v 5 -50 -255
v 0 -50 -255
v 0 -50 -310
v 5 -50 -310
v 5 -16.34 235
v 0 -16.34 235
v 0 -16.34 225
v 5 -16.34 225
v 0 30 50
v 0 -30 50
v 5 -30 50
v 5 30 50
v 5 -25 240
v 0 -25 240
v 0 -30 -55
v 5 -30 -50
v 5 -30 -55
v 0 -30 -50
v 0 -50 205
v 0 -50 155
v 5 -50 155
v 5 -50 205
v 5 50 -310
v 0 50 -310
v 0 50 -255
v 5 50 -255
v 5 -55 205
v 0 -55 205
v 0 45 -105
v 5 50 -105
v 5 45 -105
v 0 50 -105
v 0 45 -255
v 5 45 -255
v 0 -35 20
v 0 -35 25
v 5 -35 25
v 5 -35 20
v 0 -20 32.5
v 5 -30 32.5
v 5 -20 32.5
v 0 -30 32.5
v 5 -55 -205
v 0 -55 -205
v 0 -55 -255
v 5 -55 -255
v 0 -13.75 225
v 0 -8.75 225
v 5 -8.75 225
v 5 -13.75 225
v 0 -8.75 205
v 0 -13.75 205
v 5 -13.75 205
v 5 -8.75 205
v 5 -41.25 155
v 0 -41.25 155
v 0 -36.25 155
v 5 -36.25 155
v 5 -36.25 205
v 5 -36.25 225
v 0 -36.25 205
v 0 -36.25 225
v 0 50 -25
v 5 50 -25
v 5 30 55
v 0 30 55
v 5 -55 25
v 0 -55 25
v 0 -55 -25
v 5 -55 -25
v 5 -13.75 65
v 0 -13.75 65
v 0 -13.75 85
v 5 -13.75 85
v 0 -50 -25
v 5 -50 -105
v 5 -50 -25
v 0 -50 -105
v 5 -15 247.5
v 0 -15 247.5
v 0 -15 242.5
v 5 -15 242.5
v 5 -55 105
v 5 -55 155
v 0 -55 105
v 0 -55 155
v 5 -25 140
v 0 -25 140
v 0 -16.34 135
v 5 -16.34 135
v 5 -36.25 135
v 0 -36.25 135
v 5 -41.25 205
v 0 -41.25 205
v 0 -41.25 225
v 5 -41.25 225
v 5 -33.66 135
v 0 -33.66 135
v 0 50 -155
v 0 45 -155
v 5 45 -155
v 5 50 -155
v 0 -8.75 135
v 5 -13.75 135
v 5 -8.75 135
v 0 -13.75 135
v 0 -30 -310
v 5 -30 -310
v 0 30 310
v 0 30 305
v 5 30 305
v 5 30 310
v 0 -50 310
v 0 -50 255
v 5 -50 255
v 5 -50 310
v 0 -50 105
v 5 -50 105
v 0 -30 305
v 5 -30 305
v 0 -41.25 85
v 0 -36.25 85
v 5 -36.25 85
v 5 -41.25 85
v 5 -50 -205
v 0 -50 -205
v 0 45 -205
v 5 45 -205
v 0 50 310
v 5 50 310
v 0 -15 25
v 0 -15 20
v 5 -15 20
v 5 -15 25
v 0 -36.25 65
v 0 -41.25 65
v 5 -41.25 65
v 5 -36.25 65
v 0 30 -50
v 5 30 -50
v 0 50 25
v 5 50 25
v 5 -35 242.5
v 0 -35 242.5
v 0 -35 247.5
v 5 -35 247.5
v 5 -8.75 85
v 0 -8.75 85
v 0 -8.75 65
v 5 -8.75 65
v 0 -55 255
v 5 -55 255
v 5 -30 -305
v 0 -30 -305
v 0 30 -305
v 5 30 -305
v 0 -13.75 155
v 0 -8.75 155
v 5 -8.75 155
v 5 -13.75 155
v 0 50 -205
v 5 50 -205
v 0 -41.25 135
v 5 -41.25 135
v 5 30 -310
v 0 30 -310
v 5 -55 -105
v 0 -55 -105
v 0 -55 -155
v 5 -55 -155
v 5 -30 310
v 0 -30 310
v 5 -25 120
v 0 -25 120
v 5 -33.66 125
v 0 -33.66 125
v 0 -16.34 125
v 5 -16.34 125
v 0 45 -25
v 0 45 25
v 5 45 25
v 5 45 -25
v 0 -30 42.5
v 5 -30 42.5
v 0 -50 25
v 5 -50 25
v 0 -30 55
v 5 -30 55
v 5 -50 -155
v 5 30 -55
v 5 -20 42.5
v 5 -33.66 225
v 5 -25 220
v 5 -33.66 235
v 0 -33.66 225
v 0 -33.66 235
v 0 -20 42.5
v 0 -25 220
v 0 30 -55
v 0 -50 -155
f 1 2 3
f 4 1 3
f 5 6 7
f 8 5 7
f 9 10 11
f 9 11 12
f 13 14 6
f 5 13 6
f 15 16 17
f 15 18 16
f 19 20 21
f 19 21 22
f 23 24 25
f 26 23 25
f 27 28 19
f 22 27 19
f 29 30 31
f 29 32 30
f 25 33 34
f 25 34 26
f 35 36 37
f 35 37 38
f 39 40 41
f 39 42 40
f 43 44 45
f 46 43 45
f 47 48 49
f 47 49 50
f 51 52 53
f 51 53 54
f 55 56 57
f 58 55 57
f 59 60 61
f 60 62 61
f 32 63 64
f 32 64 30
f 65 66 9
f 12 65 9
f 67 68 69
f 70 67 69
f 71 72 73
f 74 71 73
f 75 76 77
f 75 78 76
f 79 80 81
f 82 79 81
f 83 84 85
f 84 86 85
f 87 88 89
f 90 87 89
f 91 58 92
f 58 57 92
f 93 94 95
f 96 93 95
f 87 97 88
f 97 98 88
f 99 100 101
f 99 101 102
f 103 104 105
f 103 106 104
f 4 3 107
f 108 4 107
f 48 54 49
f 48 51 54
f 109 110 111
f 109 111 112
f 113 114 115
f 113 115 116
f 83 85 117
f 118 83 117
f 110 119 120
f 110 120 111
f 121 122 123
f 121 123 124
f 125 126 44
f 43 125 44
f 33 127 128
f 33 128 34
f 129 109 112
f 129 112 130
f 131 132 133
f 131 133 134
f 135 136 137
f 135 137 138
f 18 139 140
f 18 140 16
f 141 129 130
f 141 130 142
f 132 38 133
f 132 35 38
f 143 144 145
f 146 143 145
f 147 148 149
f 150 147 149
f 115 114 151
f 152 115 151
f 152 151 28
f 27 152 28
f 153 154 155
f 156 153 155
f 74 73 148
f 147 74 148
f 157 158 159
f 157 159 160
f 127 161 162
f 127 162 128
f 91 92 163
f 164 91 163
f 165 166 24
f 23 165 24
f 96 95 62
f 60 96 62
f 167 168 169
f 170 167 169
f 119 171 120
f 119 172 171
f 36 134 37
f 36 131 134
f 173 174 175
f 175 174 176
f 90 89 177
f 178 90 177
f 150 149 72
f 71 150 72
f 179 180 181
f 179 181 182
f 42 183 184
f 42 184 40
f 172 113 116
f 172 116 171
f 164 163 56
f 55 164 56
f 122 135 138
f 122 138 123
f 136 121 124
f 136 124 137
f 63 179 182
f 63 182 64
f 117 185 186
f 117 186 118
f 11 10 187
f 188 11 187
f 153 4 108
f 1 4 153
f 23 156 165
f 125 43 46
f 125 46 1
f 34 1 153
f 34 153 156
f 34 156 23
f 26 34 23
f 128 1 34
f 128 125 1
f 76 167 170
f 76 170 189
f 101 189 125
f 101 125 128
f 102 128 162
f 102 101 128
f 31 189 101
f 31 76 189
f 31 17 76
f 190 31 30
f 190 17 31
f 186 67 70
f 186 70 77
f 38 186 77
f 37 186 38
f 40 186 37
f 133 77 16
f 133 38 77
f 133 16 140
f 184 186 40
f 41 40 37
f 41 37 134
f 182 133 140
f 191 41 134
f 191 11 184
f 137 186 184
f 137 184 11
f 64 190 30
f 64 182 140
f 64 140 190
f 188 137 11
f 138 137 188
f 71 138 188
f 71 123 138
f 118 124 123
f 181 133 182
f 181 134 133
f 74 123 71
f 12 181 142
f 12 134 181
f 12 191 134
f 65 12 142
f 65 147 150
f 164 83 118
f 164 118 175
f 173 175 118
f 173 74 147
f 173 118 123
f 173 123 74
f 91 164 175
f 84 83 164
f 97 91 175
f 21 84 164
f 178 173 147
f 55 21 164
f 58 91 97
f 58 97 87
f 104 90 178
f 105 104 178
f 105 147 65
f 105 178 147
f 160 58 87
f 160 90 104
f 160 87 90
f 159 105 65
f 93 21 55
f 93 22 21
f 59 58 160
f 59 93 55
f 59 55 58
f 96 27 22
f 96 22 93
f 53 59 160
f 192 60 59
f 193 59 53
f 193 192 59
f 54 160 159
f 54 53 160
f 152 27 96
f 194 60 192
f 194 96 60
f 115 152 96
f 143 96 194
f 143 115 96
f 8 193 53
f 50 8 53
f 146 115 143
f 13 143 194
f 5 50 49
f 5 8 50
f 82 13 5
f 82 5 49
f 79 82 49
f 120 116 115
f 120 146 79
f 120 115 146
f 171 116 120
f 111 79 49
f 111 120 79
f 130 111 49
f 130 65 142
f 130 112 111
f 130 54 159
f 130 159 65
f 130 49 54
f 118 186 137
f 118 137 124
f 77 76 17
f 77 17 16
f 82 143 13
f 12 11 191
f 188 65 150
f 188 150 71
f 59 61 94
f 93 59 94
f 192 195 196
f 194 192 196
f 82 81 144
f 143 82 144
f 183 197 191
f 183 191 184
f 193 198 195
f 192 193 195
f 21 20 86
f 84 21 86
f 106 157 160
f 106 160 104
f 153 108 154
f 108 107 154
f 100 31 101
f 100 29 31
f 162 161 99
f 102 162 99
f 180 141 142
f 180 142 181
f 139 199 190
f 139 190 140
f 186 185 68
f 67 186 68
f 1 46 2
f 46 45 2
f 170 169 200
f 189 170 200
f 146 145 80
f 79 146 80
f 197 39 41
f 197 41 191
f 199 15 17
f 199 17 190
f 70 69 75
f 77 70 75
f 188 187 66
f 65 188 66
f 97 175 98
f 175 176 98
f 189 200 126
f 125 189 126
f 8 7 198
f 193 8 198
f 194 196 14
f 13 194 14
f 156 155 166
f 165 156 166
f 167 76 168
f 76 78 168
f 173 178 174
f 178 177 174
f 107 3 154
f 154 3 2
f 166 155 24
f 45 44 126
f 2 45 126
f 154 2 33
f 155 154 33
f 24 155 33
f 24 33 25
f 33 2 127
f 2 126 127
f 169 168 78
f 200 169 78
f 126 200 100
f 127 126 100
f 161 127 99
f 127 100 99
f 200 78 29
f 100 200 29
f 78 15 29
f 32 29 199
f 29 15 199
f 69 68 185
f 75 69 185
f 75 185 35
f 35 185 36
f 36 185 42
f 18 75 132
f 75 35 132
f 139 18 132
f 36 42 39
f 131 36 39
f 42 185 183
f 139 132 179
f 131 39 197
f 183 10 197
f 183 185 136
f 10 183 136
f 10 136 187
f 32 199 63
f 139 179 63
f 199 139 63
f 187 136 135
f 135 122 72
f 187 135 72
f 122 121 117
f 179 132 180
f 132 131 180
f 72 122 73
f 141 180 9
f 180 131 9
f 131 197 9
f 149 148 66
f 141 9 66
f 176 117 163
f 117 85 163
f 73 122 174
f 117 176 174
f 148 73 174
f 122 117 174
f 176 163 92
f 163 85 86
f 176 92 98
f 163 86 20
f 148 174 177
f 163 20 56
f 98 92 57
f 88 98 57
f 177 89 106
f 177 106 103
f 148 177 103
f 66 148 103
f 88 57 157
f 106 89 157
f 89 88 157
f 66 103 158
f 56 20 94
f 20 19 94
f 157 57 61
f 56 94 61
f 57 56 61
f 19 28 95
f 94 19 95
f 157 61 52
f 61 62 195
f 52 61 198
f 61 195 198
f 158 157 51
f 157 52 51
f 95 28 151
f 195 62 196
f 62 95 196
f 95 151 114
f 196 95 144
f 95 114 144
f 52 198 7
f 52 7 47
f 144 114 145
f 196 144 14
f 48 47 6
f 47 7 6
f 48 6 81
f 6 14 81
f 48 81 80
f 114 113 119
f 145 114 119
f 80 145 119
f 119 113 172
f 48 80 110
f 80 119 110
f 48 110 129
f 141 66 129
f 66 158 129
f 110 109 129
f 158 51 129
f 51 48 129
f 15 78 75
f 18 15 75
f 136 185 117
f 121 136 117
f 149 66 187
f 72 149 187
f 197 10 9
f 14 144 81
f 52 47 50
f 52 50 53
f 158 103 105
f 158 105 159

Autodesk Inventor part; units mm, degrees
ref_plane "YZ Plane" through (0, 0, 0) normal (1, 0, 0) x (0, 1, 0)
ref_plane "XZ Plane" through (0, 0, 0) normal (0, 1, 0) x (-1, 0, 0)
ref_plane "XY Plane" through (0, 0, 0) normal (0, 0, 1) x (1, 0, 0)
sketch "Sketch1" plane through (0, 0, 0) normal (1, 0, 0) x (0, 1, 0)
  line L0 (-50, 50) -> (50, 50)
  line L1 (50, 50) -> (50, -50)
  line L2 (50, -50) -> (-50, -50)
  line L3 (-50, -50) -> (-50, 50)
  line L4 (-50, 50) -> (50, -50) construction
  line L5 (50, 50) -> (-50, -50) construction
  line L6 (50, 50) -> (-50, 50)
  line L7 (-50, 50) -> (-50, 310)
  line L8 (-50, 310) -> (50, 310)
  line L9 (50, 310) -> (50, 50)
  line L10 (50, -50) -> (-50, -50)
  line L11 (-50, -50) -> (-50, -310)
  line L12 (-50, -310) -> (50, -310)
  line L13 (50, -310) -> (50, -50)
  line L14 (-50, 255) -> (-55, 255)
  line L15 (-55, 255) -> (-55, 205)
  line L16 (-55, 205) -> (-50, 205)
  line L17 (-50, 205) -> (-50, 255)
  line L18 (-50, 155) -> (-55, 155)
  line L19 (-55, 155) -> (-55, 105)
  line L20 (-55, 105) -> (-50, 105)
  line L21 (-50, 105) -> (-50, 155)
  line L22 (-50, 25) -> (-55, 25)
  line L23 (-55, 25) -> (-55, -25)
  line L24 (-55, -25) -> (-50, -25)
  line L25 (-50, -25) -> (-50, 25)
  line L26 (-50, -105) -> (-55, -105)
  line L27 (-55, -105) -> (-55, -155)
  line L28 (-55, -155) -> (-50, -155)
  line L29 (-50, -155) -> (-50, -105)
  line L30 (-50, -205) -> (-55, -205)
  line L31 (-55, -205) -> (-55, -255)
  line L32 (-55, -255) -> (-50, -255)
  line L33 (-50, -255) -> (-50, -205)
  line L34 (50, 310) -> (30, 310)
  line L35 (50, 305) -> (50, 310)
  line L36 (-50, 310) -> (-30, 310)
  line L37 (-50, 305) -> (-50, 310)
  line L38 (30, 50) -> (-30, 50)
  line L39 (-30, 50) -> (-30, 55)
  line L40 (-30, 55) -> (30, 55)
  line L41 (30, 55) -> (30, 50)
  line L42 (30, -50) -> (-21.1124, -50)
  line L43 (50, 0) -> (-50, 0) construction
  line L44 (-30, -50) -> (-30, -55)
  line L45 (-30, -55) -> (30, -55)
  line L46 (30, -55) -> (30, -50)
  line L47 (30, 310) -> (-30, 310)
  line L48 (-30, 310) -> (-30, 305)
  line L49 (-30, 305) -> (30, 305)
  line L50 (30, 305) -> (30, 310)
  line L51 (-30, -310) -> (-30, -305)
  line L52 (-30, -305) -> (30, -305)
  line L53 (30, -305) -> (30, -310)
  line L54 (50, 25) -> (45, 25)
  line L55 (45, 25) -> (45, -25)
  line L56 (45, -25) -> (50, -25)
  line L57 (50, -25) -> (50, 25)
  line L58 (50, -105) -> (45, -105)
  line L59 (45, -105) -> (45, -155)
  line L60 (45, -155) -> (50, -155)
  line L61 (50, -155) -> (50, -105)
  line L62 (50, -205) -> (45, -205)
  line L63 (45, -205) -> (45, -255)
  line L64 (45, -255) -> (50, -255)
  line L65 (50, -255) -> (50, -205)
  line L66 (-33.6603, 235) -> (-25, 240)
  line L67 (-25, 240) -> (-16.3397, 235)
  line L68 (-16.3397, 235) -> (-16.3397, 225)
  line L69 (-16.3397, 225) -> (-25, 220)
  line L70 (-25, 220) -> (-33.6603, 225)
  line L71 (-33.6603, 225) -> (-33.6603, 235)
  line L72 (-33.6603, 135) -> (-25, 140)
  line L73 (-25, 140) -> (-16.3397, 135)
  line L74 (-16.3397, 135) -> (-16.3397, 125)
  line L75 (-16.3397, 125) -> (-25, 120)
  line L76 (-25, 120) -> (-33.6603, 125)
  line L77 (-33.6603, 125) -> (-33.6603, 135)
  line L78 (-8.75, 225) -> (-13.75, 225)
  line L79 (-13.75, 225) -> (-13.75, 205)
  line L80 (-13.75, 205) -> (-8.75, 205)
  line L81 (-8.75, 205) -> (-8.75, 225)
  line L82 (-13.75, 135) -> (-8.75, 135)
  line L83 (-8.75, 135) -> (-8.75, 155)
  line L84 (-8.75, 155) -> (-13.75, 155)
  line L85 (-13.75, 155) -> (-13.75, 135)
  line L86 (-13.75, 85) -> (-8.75, 85)
  line L87 (-8.75, 85) -> (-8.75, 65)
  line L88 (-8.75, 65) -> (-13.75, 65)
  line L89 (-13.75, 65) -> (-13.75, 85)
  line L90 (-15, 242.5) -> (-35, 242.5)
  line L91 (-35, 242.5) -> (-35, 247.5)
  line L92 (-35, 247.5) -> (-15, 247.5)
  line L93 (-15, 247.5) -> (-15, 242.5)
  line L94 (-25, 361.7934) -> (-25, -98.4217) construction
  line L95 (-41.25, 65) -> (-36.25, 65)
  line L96 (-36.25, 65) -> (-36.25, 85)
  line L97 (-36.25, 85) -> (-41.25, 85)
  line L98 (-41.25, 85) -> (-41.25, 65)
  line L99 (-36.25, 135) -> (-41.25, 135)
  line L100 (-36.25, 155) -> (-36.25, 135)
  line L101 (-41.25, 135) -> (-41.25, 155)
  line L102 (-41.25, 155) -> (-36.25, 155)
  line L103 (-36.25, 205) -> (-41.25, 205)
  line L104 (-36.25, 225) -> (-36.25, 205)
  line L105 (-41.25, 225) -> (-36.25, 225)
  line L106 (-41.25, 205) -> (-41.25, 225)
  line L107 (-35, 20) -> (-15, 20)
  line L108 (-15, 20) -> (-15, 25)
  line L109 (-15, 25) -> (-35, 25)
  line L110 (-35, 25) -> (-35, 20)
  line L111 (-20, 42.5) -> (-30, 42.5)
  line L112 (-30, 42.5) -> (-30, 32.5)
  line L113 (-30, 32.5) -> (-20, 32.5)
  line L114 (-20, 32.5) -> (-20, 42.5)
  point P0 (0, 0)
  point P1 (-52.5, 155)
  point P2 (-52.5, 205)
  point P3 (-50, 205)
  point P4 (-50, 105)
  point P5 (-50, -155)
  point P6 (-50, -255)
  point P7 (30, -50)
  point P8 (-30, -50)
  point P9 (30, 50)
  point P10 (30, 307.5)
  point P11 (-30, -310)
  point P12 (30, 310)
  point P13 (-30, 310)
  point P14 (50, -25)
  point P15 (50, -255)
  point P16 (50, -155)
  point P17 (-25, 230)
  point P18 (-25, 130)
  point P19 (-13.75, 145)
  point P20 (-15, 245)
  point P21 (-36.25, 145)
  point P22 (-20, 37.5)
  dimension "d0" = 100
  dimension "d1" = 260
  dimension "d2" = 100
  dimension "d3" = 260
  dimension "d4" = 50
  dimension "d5" = 50
  dimension "d6" = 50
  dimension "d7" = 50
  dimension "d8" = 50
  dimension "d9" = 55
  dimension "d10" = 50
  dimension "d11" = 25
  dimension "d12" = 55
  dimension "d13" = 50
  dimension "d14" = 5
  dimension "d20" = 5
  dimension "d21" = 5
  dimension "d23" = 20
  dimension "d24" = 50
  dimension "d25" = 5
  dimension "d26" = 20
  dimension "d27" = 10
  dimension "d28" = 25
  dimension "d29" = 16.3397
  dimension "d30" = 25
  dimension "d31" = 10
  dimension "d32" = 25
  dimension "d33" = 16.3397
  dimension "d34" = 25
  dimension "d38" = 20
  dimension "d40" = 5
  dimension "d41" = 20
  dimension "d42" = 5
  dimension "d45" = 20
  dimension "d46" = 5
  dimension "d48" = 20
  dimension "d49" = 5
  dimension "d51" = 25
  dimension "d52" = 50
  dimension "d53" = 50
  dimension "d54" = 11.25
  dimension "d55" = 12.5
  dimension "d56" = 10
  dimension "d57" = 20
  dimension "d58" = 5
  dimension "d59" = 40
  dimension "d60" = 10
  dimension "d61" = 10
  dimension "d62" = 10
  dimension "d63" = 5
  dimension "d64" = 7.5
extrude "Extrusion1" add sketch "Sketch1" along normal blind 5 contours L7 L8 L48 L49 L50 L9 L0 L41 L40 L39 | L0 L1 L54 L55 L56 L2 L3 | L3 L24 L23 L22 | L20 L19 L18 L7 | L2 L44 L45 L46 L13 L58 L59 L60 L62 L63 L64 L12 L53 L52 L51 L11 | L16 L15 L14 L7 | L11 L28 L27 L26 | L11 L32 L31 L30
equation "\"BendRadius\" = Thickness"
equation "\"BendReliefWidth\" = Thickness"
equation "\"BendReliefDepth\" = 0.5 * Thickness"
equation "\"CornerReliefSize\" = 4 * Thickness"
equation "\"MinimumRemnant\" = 2 * Thickness"
equation "\"TransitionRadius\" = BendRadius"
equation "\"JacobiRadiusSize\" = BendRadius"
equation "\"GapSize\" = Thickness"
equation "\"Thickness\" = 3.048"
properties part number "Lat3" material "Wood (Cherry)"
